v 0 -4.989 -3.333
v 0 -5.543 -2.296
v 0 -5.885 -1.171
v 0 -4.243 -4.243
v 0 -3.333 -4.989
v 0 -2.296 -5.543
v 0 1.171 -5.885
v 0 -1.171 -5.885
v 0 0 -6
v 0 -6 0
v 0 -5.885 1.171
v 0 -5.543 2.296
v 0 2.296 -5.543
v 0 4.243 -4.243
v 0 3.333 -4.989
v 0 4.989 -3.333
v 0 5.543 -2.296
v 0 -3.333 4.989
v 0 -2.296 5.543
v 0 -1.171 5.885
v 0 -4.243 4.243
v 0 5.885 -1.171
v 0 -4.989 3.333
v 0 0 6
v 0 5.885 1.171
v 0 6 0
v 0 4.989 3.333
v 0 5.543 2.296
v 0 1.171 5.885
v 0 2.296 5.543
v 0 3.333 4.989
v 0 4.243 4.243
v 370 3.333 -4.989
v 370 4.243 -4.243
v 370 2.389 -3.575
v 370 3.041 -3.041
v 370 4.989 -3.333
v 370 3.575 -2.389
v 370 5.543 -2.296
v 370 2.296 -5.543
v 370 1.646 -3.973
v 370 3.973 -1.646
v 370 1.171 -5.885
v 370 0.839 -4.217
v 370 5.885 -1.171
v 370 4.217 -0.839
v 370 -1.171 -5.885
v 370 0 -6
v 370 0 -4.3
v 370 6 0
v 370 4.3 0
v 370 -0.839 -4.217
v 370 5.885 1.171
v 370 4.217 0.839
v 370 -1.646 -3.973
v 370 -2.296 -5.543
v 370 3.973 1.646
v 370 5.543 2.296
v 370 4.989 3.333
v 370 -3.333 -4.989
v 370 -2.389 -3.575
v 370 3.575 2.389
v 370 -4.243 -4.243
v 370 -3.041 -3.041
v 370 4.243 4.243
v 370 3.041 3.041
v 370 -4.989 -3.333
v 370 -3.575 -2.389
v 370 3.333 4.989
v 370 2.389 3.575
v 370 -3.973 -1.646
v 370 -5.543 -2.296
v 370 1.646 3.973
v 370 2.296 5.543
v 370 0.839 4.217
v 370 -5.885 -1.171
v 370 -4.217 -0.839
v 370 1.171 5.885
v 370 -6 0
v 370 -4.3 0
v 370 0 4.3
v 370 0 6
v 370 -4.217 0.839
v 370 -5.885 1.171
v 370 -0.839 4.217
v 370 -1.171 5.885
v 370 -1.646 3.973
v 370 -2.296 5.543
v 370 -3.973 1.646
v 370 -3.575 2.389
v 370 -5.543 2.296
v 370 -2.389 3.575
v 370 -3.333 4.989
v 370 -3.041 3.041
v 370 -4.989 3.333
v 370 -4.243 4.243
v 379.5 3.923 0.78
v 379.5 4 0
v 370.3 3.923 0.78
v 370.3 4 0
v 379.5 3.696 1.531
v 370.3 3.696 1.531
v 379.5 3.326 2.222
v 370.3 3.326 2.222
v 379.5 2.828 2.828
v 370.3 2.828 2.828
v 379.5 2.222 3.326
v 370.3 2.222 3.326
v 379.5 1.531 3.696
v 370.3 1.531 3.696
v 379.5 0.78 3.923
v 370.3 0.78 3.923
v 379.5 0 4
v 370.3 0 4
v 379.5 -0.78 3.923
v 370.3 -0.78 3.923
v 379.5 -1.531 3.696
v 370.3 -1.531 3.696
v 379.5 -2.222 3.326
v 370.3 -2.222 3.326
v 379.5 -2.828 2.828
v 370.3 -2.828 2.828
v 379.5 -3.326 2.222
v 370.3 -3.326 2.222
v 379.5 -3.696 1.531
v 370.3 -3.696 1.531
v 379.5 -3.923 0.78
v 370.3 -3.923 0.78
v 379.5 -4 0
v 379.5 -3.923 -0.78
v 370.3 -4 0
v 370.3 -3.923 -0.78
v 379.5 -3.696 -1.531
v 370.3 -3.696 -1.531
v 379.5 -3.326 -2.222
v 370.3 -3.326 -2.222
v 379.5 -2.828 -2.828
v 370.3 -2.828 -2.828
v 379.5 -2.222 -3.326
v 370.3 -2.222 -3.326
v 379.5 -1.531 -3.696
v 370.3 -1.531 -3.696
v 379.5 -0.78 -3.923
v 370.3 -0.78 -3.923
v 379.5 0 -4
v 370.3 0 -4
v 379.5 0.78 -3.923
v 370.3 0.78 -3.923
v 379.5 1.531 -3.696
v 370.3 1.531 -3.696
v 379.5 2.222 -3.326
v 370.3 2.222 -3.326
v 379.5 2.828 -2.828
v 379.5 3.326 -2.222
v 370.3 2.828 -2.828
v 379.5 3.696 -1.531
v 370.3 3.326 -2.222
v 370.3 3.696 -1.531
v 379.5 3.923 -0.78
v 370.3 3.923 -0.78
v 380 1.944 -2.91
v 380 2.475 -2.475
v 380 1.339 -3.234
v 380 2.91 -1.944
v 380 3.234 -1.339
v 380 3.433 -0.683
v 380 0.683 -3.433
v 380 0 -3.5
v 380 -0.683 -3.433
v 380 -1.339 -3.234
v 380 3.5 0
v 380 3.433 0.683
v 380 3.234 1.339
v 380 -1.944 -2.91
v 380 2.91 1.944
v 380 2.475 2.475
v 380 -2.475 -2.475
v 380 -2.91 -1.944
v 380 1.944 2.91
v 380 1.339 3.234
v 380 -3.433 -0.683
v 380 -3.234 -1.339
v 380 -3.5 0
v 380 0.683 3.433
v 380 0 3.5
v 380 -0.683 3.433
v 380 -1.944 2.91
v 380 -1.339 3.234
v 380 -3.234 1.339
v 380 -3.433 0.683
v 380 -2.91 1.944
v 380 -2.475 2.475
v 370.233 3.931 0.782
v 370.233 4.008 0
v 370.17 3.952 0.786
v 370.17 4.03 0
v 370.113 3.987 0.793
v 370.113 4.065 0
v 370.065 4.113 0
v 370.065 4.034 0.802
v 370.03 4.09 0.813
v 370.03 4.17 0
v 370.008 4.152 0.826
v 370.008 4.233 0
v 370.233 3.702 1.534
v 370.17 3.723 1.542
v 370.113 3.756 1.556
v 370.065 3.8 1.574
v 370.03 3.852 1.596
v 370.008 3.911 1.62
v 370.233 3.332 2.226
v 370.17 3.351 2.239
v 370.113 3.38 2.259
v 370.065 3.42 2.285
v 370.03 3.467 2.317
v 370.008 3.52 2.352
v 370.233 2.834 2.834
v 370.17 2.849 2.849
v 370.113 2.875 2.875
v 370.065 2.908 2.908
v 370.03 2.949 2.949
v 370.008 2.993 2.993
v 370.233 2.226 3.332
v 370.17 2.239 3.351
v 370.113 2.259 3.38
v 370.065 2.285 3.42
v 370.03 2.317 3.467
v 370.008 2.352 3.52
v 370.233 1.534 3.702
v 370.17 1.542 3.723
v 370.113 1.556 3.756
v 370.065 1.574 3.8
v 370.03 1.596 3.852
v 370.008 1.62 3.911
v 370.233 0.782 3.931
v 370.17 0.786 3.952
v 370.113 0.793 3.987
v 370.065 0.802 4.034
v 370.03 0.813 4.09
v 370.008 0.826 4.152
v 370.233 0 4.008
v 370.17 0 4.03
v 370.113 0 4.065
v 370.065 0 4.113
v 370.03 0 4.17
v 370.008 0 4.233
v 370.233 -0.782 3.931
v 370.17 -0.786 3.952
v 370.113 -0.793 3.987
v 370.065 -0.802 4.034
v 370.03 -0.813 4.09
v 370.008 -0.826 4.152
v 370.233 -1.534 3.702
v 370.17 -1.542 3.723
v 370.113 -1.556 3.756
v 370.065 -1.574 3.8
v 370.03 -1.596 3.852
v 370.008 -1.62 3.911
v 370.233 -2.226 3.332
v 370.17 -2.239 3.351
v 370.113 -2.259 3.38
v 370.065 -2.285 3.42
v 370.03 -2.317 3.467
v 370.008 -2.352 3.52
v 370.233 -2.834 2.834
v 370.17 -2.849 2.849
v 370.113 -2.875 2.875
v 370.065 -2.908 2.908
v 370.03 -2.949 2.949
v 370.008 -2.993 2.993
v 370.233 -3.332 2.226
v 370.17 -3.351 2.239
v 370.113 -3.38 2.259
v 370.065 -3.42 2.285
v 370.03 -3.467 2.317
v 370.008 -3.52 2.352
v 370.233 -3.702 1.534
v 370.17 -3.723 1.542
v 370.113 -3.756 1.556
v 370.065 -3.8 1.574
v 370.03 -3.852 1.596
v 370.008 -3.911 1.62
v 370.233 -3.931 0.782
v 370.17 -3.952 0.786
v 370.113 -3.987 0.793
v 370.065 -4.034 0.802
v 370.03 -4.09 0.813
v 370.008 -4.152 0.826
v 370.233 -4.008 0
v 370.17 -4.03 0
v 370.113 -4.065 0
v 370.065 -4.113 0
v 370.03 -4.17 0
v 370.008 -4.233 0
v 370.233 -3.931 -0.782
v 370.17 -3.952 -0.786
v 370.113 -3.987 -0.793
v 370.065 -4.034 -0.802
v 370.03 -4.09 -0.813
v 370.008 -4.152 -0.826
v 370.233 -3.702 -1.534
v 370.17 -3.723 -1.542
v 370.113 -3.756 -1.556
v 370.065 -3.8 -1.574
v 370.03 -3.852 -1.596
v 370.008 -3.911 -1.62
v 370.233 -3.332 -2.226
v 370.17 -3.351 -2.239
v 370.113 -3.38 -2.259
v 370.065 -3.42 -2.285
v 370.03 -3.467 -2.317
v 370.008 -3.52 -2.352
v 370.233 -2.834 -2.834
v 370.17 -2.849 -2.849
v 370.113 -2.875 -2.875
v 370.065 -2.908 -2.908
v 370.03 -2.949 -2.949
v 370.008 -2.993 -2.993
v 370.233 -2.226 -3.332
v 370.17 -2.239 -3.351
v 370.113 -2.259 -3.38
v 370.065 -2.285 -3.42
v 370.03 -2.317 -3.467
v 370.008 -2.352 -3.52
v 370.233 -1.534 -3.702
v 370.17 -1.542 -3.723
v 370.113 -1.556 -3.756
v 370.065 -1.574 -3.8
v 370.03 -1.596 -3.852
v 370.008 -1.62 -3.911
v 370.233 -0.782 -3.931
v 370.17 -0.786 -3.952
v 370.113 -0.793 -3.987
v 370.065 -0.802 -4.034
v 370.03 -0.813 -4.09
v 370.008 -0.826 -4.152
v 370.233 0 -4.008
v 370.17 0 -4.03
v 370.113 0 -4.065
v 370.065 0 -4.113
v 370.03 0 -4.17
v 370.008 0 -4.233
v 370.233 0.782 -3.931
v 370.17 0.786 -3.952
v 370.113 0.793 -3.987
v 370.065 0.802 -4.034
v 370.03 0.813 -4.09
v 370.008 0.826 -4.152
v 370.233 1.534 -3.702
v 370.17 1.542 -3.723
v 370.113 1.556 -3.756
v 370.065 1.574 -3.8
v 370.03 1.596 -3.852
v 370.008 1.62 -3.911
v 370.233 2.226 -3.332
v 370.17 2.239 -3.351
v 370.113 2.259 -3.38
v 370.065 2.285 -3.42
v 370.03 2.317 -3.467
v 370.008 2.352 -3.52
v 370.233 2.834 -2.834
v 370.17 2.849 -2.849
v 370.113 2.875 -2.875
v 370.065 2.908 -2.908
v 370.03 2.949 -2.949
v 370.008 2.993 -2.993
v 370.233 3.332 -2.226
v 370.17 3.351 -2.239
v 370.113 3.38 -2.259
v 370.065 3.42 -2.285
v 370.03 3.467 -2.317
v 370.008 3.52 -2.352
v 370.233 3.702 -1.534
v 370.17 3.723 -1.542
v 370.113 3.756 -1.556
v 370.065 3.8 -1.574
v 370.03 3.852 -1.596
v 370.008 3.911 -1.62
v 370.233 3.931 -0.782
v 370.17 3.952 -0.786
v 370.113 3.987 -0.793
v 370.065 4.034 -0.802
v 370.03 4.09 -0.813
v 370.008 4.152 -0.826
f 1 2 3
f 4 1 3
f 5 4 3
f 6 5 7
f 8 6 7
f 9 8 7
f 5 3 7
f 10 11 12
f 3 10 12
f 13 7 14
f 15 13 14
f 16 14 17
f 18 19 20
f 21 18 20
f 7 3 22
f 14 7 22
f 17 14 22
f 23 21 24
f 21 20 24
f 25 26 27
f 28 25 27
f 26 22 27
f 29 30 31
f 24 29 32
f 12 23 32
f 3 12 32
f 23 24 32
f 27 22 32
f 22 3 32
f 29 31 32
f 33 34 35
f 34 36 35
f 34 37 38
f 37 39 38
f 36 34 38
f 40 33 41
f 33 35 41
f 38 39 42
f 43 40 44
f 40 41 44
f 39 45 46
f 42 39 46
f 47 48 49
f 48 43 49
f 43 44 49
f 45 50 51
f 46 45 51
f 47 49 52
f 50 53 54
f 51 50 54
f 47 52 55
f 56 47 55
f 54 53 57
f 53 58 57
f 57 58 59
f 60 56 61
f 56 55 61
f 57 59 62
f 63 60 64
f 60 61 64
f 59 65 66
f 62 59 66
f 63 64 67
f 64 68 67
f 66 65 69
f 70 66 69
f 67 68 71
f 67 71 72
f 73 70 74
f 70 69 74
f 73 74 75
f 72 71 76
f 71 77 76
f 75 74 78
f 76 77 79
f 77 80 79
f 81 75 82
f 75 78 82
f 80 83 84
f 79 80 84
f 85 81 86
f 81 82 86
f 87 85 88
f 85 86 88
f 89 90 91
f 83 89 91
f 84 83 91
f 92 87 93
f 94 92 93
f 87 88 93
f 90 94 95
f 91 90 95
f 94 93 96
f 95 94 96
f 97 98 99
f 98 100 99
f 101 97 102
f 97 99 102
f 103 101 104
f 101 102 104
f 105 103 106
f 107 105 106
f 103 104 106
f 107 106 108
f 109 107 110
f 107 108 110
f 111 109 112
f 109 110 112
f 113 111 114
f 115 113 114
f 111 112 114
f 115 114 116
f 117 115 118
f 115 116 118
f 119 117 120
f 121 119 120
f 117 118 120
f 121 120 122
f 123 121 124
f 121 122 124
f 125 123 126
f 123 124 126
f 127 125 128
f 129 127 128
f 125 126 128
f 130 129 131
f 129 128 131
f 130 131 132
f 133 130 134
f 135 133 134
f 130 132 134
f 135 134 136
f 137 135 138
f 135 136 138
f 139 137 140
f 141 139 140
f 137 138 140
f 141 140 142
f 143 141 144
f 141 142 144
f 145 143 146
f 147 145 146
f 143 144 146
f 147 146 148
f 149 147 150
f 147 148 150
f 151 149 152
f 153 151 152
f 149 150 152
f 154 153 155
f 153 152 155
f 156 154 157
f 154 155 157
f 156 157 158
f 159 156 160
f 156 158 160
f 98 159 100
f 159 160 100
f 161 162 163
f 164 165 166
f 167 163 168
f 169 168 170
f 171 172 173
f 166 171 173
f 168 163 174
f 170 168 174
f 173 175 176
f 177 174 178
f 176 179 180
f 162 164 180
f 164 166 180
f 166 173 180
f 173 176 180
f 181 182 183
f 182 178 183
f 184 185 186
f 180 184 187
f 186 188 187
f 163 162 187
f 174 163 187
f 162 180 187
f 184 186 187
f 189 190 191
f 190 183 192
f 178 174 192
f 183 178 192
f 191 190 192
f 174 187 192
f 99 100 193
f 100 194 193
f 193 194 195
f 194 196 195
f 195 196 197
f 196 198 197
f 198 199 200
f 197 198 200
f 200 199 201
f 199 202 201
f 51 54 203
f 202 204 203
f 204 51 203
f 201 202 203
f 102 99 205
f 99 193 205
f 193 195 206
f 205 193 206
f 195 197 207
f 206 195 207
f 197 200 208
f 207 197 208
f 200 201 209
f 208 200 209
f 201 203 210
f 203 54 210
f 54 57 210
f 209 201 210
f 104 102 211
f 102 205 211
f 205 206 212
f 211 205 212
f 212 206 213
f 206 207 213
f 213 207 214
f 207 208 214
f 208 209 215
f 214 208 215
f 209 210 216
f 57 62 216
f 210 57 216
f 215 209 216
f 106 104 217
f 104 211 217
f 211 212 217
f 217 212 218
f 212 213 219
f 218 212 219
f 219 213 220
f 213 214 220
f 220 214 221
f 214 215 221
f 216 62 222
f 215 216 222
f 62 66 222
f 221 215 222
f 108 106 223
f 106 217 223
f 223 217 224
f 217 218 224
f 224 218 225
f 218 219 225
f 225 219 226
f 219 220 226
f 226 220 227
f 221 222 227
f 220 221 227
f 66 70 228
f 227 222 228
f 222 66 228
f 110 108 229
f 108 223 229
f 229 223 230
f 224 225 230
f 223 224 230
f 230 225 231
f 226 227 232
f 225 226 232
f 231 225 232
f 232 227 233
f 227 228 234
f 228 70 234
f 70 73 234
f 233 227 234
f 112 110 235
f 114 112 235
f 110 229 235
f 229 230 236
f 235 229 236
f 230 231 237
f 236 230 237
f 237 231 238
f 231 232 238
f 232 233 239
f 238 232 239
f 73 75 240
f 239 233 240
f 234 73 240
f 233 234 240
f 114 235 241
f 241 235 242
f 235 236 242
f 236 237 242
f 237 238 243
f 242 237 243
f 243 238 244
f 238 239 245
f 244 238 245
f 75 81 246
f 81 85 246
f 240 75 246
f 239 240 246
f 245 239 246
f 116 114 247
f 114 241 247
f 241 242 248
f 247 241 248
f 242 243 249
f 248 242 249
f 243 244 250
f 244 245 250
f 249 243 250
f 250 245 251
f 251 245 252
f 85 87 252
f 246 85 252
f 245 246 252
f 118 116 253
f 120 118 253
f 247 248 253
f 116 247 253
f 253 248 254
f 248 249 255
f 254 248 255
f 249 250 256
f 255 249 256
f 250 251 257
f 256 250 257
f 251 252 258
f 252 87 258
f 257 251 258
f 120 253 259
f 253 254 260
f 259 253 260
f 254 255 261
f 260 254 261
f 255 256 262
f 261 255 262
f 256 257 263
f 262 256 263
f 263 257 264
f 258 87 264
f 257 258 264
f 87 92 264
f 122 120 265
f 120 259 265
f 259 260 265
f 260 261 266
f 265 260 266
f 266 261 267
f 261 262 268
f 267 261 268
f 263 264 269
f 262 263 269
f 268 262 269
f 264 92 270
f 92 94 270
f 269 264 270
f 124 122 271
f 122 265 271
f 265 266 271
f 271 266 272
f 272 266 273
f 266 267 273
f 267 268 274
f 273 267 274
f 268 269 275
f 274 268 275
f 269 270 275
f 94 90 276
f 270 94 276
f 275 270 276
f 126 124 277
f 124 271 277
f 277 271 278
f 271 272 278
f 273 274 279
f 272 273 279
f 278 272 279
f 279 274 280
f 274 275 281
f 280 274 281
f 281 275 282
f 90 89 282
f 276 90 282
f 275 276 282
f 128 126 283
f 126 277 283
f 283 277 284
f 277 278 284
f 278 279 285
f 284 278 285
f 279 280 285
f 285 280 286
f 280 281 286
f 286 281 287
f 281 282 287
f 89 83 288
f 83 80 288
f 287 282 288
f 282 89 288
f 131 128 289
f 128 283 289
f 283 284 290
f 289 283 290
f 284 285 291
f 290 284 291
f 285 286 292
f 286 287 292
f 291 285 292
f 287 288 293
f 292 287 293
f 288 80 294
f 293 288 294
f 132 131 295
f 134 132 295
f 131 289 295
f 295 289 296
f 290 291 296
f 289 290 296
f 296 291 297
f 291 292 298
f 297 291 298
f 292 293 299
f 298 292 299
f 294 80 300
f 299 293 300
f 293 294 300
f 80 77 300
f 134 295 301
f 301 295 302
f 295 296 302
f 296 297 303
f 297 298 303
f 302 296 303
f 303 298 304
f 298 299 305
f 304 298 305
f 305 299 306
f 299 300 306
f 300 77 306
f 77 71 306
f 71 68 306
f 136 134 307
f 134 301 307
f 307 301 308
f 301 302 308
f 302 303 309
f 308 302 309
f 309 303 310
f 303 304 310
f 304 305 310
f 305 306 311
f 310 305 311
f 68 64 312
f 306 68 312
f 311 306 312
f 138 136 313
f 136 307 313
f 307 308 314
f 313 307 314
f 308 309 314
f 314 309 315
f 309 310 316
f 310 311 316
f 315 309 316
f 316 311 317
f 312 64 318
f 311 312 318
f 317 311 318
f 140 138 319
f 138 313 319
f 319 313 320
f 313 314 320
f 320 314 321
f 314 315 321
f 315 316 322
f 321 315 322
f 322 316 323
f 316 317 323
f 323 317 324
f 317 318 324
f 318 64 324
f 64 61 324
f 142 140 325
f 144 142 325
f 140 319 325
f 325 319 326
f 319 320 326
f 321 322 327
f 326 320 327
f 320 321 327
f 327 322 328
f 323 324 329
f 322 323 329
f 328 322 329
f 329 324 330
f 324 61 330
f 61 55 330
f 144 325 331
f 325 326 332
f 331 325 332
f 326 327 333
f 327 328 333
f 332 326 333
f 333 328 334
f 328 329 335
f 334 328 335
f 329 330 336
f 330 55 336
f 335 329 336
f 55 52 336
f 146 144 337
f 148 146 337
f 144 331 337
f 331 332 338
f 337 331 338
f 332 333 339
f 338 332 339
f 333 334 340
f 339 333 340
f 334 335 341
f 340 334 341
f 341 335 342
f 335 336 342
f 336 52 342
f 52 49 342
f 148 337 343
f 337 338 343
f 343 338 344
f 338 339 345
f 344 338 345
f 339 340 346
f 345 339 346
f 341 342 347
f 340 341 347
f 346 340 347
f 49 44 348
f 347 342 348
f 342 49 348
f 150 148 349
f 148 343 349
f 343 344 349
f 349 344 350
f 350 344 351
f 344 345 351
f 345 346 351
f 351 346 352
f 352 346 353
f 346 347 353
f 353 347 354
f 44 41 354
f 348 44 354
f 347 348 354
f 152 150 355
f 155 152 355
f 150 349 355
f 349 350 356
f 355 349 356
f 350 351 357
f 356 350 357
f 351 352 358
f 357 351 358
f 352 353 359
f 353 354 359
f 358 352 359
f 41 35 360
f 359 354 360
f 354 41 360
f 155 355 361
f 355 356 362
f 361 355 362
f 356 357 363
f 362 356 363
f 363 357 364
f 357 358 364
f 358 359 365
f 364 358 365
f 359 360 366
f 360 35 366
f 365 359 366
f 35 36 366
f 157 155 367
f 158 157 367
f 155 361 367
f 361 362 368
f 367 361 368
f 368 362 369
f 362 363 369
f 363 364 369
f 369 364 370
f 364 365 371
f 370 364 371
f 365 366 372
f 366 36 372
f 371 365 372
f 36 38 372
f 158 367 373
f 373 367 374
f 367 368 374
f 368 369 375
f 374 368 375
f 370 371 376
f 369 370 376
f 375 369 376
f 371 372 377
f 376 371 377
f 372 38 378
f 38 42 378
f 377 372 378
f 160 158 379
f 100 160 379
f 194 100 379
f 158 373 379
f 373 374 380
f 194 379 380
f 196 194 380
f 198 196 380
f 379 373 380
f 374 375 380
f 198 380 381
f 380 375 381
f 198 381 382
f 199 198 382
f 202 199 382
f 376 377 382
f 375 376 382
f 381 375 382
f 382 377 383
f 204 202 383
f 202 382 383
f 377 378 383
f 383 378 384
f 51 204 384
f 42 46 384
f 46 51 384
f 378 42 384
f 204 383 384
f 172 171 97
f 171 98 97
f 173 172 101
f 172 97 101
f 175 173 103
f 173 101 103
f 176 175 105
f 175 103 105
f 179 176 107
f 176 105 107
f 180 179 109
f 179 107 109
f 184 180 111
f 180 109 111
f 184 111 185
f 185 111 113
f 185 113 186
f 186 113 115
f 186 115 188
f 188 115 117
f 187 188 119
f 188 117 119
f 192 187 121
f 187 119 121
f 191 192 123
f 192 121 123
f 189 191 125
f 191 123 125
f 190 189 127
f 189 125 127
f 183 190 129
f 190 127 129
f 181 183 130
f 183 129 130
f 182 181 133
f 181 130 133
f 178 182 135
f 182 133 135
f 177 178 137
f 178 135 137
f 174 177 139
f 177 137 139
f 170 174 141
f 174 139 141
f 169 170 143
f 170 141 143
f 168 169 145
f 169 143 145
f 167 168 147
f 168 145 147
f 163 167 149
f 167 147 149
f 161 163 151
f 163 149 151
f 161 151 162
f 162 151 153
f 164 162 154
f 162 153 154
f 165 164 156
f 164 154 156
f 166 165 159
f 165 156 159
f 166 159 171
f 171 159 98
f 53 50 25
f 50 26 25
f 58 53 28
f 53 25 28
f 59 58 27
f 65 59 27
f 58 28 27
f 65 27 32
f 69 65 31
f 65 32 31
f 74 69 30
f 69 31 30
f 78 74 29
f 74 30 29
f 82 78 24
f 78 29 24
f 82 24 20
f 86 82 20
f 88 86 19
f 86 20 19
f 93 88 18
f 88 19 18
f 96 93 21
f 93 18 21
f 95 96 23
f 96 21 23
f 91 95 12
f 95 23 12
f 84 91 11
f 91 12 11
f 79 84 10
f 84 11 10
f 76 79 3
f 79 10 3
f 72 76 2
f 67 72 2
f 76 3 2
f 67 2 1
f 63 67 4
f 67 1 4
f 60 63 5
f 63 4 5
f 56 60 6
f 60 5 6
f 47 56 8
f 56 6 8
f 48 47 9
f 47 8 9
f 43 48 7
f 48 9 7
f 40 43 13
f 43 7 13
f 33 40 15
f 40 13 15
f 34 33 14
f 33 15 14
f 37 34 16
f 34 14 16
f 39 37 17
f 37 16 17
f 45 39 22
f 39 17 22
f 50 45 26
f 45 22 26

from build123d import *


with BuildPart() as part:
    # Sketch1 → Revolve1 (revolve)
    with BuildSketch(Plane.XY):
        with BuildLine():
            Line((0, 6), (0, 0))
            Line((0, 0), (380, 0))
            Line((380, 0), (380, 3.5))
            Line((380, 3.5), (379.5, 4))
            Line((379.5, 4), (370.3, 4))
            ThreePointArc((370.3, 4), (370.087867966, 4.087867966), (370, 4.3))
            Line((370, 4.3), (370, 6))
            Line((370, 6), (0, 6))
        make_face()
    revolve(axis=Axis((0, 0, 0), (1, 0, 0)))


solid = part.part
